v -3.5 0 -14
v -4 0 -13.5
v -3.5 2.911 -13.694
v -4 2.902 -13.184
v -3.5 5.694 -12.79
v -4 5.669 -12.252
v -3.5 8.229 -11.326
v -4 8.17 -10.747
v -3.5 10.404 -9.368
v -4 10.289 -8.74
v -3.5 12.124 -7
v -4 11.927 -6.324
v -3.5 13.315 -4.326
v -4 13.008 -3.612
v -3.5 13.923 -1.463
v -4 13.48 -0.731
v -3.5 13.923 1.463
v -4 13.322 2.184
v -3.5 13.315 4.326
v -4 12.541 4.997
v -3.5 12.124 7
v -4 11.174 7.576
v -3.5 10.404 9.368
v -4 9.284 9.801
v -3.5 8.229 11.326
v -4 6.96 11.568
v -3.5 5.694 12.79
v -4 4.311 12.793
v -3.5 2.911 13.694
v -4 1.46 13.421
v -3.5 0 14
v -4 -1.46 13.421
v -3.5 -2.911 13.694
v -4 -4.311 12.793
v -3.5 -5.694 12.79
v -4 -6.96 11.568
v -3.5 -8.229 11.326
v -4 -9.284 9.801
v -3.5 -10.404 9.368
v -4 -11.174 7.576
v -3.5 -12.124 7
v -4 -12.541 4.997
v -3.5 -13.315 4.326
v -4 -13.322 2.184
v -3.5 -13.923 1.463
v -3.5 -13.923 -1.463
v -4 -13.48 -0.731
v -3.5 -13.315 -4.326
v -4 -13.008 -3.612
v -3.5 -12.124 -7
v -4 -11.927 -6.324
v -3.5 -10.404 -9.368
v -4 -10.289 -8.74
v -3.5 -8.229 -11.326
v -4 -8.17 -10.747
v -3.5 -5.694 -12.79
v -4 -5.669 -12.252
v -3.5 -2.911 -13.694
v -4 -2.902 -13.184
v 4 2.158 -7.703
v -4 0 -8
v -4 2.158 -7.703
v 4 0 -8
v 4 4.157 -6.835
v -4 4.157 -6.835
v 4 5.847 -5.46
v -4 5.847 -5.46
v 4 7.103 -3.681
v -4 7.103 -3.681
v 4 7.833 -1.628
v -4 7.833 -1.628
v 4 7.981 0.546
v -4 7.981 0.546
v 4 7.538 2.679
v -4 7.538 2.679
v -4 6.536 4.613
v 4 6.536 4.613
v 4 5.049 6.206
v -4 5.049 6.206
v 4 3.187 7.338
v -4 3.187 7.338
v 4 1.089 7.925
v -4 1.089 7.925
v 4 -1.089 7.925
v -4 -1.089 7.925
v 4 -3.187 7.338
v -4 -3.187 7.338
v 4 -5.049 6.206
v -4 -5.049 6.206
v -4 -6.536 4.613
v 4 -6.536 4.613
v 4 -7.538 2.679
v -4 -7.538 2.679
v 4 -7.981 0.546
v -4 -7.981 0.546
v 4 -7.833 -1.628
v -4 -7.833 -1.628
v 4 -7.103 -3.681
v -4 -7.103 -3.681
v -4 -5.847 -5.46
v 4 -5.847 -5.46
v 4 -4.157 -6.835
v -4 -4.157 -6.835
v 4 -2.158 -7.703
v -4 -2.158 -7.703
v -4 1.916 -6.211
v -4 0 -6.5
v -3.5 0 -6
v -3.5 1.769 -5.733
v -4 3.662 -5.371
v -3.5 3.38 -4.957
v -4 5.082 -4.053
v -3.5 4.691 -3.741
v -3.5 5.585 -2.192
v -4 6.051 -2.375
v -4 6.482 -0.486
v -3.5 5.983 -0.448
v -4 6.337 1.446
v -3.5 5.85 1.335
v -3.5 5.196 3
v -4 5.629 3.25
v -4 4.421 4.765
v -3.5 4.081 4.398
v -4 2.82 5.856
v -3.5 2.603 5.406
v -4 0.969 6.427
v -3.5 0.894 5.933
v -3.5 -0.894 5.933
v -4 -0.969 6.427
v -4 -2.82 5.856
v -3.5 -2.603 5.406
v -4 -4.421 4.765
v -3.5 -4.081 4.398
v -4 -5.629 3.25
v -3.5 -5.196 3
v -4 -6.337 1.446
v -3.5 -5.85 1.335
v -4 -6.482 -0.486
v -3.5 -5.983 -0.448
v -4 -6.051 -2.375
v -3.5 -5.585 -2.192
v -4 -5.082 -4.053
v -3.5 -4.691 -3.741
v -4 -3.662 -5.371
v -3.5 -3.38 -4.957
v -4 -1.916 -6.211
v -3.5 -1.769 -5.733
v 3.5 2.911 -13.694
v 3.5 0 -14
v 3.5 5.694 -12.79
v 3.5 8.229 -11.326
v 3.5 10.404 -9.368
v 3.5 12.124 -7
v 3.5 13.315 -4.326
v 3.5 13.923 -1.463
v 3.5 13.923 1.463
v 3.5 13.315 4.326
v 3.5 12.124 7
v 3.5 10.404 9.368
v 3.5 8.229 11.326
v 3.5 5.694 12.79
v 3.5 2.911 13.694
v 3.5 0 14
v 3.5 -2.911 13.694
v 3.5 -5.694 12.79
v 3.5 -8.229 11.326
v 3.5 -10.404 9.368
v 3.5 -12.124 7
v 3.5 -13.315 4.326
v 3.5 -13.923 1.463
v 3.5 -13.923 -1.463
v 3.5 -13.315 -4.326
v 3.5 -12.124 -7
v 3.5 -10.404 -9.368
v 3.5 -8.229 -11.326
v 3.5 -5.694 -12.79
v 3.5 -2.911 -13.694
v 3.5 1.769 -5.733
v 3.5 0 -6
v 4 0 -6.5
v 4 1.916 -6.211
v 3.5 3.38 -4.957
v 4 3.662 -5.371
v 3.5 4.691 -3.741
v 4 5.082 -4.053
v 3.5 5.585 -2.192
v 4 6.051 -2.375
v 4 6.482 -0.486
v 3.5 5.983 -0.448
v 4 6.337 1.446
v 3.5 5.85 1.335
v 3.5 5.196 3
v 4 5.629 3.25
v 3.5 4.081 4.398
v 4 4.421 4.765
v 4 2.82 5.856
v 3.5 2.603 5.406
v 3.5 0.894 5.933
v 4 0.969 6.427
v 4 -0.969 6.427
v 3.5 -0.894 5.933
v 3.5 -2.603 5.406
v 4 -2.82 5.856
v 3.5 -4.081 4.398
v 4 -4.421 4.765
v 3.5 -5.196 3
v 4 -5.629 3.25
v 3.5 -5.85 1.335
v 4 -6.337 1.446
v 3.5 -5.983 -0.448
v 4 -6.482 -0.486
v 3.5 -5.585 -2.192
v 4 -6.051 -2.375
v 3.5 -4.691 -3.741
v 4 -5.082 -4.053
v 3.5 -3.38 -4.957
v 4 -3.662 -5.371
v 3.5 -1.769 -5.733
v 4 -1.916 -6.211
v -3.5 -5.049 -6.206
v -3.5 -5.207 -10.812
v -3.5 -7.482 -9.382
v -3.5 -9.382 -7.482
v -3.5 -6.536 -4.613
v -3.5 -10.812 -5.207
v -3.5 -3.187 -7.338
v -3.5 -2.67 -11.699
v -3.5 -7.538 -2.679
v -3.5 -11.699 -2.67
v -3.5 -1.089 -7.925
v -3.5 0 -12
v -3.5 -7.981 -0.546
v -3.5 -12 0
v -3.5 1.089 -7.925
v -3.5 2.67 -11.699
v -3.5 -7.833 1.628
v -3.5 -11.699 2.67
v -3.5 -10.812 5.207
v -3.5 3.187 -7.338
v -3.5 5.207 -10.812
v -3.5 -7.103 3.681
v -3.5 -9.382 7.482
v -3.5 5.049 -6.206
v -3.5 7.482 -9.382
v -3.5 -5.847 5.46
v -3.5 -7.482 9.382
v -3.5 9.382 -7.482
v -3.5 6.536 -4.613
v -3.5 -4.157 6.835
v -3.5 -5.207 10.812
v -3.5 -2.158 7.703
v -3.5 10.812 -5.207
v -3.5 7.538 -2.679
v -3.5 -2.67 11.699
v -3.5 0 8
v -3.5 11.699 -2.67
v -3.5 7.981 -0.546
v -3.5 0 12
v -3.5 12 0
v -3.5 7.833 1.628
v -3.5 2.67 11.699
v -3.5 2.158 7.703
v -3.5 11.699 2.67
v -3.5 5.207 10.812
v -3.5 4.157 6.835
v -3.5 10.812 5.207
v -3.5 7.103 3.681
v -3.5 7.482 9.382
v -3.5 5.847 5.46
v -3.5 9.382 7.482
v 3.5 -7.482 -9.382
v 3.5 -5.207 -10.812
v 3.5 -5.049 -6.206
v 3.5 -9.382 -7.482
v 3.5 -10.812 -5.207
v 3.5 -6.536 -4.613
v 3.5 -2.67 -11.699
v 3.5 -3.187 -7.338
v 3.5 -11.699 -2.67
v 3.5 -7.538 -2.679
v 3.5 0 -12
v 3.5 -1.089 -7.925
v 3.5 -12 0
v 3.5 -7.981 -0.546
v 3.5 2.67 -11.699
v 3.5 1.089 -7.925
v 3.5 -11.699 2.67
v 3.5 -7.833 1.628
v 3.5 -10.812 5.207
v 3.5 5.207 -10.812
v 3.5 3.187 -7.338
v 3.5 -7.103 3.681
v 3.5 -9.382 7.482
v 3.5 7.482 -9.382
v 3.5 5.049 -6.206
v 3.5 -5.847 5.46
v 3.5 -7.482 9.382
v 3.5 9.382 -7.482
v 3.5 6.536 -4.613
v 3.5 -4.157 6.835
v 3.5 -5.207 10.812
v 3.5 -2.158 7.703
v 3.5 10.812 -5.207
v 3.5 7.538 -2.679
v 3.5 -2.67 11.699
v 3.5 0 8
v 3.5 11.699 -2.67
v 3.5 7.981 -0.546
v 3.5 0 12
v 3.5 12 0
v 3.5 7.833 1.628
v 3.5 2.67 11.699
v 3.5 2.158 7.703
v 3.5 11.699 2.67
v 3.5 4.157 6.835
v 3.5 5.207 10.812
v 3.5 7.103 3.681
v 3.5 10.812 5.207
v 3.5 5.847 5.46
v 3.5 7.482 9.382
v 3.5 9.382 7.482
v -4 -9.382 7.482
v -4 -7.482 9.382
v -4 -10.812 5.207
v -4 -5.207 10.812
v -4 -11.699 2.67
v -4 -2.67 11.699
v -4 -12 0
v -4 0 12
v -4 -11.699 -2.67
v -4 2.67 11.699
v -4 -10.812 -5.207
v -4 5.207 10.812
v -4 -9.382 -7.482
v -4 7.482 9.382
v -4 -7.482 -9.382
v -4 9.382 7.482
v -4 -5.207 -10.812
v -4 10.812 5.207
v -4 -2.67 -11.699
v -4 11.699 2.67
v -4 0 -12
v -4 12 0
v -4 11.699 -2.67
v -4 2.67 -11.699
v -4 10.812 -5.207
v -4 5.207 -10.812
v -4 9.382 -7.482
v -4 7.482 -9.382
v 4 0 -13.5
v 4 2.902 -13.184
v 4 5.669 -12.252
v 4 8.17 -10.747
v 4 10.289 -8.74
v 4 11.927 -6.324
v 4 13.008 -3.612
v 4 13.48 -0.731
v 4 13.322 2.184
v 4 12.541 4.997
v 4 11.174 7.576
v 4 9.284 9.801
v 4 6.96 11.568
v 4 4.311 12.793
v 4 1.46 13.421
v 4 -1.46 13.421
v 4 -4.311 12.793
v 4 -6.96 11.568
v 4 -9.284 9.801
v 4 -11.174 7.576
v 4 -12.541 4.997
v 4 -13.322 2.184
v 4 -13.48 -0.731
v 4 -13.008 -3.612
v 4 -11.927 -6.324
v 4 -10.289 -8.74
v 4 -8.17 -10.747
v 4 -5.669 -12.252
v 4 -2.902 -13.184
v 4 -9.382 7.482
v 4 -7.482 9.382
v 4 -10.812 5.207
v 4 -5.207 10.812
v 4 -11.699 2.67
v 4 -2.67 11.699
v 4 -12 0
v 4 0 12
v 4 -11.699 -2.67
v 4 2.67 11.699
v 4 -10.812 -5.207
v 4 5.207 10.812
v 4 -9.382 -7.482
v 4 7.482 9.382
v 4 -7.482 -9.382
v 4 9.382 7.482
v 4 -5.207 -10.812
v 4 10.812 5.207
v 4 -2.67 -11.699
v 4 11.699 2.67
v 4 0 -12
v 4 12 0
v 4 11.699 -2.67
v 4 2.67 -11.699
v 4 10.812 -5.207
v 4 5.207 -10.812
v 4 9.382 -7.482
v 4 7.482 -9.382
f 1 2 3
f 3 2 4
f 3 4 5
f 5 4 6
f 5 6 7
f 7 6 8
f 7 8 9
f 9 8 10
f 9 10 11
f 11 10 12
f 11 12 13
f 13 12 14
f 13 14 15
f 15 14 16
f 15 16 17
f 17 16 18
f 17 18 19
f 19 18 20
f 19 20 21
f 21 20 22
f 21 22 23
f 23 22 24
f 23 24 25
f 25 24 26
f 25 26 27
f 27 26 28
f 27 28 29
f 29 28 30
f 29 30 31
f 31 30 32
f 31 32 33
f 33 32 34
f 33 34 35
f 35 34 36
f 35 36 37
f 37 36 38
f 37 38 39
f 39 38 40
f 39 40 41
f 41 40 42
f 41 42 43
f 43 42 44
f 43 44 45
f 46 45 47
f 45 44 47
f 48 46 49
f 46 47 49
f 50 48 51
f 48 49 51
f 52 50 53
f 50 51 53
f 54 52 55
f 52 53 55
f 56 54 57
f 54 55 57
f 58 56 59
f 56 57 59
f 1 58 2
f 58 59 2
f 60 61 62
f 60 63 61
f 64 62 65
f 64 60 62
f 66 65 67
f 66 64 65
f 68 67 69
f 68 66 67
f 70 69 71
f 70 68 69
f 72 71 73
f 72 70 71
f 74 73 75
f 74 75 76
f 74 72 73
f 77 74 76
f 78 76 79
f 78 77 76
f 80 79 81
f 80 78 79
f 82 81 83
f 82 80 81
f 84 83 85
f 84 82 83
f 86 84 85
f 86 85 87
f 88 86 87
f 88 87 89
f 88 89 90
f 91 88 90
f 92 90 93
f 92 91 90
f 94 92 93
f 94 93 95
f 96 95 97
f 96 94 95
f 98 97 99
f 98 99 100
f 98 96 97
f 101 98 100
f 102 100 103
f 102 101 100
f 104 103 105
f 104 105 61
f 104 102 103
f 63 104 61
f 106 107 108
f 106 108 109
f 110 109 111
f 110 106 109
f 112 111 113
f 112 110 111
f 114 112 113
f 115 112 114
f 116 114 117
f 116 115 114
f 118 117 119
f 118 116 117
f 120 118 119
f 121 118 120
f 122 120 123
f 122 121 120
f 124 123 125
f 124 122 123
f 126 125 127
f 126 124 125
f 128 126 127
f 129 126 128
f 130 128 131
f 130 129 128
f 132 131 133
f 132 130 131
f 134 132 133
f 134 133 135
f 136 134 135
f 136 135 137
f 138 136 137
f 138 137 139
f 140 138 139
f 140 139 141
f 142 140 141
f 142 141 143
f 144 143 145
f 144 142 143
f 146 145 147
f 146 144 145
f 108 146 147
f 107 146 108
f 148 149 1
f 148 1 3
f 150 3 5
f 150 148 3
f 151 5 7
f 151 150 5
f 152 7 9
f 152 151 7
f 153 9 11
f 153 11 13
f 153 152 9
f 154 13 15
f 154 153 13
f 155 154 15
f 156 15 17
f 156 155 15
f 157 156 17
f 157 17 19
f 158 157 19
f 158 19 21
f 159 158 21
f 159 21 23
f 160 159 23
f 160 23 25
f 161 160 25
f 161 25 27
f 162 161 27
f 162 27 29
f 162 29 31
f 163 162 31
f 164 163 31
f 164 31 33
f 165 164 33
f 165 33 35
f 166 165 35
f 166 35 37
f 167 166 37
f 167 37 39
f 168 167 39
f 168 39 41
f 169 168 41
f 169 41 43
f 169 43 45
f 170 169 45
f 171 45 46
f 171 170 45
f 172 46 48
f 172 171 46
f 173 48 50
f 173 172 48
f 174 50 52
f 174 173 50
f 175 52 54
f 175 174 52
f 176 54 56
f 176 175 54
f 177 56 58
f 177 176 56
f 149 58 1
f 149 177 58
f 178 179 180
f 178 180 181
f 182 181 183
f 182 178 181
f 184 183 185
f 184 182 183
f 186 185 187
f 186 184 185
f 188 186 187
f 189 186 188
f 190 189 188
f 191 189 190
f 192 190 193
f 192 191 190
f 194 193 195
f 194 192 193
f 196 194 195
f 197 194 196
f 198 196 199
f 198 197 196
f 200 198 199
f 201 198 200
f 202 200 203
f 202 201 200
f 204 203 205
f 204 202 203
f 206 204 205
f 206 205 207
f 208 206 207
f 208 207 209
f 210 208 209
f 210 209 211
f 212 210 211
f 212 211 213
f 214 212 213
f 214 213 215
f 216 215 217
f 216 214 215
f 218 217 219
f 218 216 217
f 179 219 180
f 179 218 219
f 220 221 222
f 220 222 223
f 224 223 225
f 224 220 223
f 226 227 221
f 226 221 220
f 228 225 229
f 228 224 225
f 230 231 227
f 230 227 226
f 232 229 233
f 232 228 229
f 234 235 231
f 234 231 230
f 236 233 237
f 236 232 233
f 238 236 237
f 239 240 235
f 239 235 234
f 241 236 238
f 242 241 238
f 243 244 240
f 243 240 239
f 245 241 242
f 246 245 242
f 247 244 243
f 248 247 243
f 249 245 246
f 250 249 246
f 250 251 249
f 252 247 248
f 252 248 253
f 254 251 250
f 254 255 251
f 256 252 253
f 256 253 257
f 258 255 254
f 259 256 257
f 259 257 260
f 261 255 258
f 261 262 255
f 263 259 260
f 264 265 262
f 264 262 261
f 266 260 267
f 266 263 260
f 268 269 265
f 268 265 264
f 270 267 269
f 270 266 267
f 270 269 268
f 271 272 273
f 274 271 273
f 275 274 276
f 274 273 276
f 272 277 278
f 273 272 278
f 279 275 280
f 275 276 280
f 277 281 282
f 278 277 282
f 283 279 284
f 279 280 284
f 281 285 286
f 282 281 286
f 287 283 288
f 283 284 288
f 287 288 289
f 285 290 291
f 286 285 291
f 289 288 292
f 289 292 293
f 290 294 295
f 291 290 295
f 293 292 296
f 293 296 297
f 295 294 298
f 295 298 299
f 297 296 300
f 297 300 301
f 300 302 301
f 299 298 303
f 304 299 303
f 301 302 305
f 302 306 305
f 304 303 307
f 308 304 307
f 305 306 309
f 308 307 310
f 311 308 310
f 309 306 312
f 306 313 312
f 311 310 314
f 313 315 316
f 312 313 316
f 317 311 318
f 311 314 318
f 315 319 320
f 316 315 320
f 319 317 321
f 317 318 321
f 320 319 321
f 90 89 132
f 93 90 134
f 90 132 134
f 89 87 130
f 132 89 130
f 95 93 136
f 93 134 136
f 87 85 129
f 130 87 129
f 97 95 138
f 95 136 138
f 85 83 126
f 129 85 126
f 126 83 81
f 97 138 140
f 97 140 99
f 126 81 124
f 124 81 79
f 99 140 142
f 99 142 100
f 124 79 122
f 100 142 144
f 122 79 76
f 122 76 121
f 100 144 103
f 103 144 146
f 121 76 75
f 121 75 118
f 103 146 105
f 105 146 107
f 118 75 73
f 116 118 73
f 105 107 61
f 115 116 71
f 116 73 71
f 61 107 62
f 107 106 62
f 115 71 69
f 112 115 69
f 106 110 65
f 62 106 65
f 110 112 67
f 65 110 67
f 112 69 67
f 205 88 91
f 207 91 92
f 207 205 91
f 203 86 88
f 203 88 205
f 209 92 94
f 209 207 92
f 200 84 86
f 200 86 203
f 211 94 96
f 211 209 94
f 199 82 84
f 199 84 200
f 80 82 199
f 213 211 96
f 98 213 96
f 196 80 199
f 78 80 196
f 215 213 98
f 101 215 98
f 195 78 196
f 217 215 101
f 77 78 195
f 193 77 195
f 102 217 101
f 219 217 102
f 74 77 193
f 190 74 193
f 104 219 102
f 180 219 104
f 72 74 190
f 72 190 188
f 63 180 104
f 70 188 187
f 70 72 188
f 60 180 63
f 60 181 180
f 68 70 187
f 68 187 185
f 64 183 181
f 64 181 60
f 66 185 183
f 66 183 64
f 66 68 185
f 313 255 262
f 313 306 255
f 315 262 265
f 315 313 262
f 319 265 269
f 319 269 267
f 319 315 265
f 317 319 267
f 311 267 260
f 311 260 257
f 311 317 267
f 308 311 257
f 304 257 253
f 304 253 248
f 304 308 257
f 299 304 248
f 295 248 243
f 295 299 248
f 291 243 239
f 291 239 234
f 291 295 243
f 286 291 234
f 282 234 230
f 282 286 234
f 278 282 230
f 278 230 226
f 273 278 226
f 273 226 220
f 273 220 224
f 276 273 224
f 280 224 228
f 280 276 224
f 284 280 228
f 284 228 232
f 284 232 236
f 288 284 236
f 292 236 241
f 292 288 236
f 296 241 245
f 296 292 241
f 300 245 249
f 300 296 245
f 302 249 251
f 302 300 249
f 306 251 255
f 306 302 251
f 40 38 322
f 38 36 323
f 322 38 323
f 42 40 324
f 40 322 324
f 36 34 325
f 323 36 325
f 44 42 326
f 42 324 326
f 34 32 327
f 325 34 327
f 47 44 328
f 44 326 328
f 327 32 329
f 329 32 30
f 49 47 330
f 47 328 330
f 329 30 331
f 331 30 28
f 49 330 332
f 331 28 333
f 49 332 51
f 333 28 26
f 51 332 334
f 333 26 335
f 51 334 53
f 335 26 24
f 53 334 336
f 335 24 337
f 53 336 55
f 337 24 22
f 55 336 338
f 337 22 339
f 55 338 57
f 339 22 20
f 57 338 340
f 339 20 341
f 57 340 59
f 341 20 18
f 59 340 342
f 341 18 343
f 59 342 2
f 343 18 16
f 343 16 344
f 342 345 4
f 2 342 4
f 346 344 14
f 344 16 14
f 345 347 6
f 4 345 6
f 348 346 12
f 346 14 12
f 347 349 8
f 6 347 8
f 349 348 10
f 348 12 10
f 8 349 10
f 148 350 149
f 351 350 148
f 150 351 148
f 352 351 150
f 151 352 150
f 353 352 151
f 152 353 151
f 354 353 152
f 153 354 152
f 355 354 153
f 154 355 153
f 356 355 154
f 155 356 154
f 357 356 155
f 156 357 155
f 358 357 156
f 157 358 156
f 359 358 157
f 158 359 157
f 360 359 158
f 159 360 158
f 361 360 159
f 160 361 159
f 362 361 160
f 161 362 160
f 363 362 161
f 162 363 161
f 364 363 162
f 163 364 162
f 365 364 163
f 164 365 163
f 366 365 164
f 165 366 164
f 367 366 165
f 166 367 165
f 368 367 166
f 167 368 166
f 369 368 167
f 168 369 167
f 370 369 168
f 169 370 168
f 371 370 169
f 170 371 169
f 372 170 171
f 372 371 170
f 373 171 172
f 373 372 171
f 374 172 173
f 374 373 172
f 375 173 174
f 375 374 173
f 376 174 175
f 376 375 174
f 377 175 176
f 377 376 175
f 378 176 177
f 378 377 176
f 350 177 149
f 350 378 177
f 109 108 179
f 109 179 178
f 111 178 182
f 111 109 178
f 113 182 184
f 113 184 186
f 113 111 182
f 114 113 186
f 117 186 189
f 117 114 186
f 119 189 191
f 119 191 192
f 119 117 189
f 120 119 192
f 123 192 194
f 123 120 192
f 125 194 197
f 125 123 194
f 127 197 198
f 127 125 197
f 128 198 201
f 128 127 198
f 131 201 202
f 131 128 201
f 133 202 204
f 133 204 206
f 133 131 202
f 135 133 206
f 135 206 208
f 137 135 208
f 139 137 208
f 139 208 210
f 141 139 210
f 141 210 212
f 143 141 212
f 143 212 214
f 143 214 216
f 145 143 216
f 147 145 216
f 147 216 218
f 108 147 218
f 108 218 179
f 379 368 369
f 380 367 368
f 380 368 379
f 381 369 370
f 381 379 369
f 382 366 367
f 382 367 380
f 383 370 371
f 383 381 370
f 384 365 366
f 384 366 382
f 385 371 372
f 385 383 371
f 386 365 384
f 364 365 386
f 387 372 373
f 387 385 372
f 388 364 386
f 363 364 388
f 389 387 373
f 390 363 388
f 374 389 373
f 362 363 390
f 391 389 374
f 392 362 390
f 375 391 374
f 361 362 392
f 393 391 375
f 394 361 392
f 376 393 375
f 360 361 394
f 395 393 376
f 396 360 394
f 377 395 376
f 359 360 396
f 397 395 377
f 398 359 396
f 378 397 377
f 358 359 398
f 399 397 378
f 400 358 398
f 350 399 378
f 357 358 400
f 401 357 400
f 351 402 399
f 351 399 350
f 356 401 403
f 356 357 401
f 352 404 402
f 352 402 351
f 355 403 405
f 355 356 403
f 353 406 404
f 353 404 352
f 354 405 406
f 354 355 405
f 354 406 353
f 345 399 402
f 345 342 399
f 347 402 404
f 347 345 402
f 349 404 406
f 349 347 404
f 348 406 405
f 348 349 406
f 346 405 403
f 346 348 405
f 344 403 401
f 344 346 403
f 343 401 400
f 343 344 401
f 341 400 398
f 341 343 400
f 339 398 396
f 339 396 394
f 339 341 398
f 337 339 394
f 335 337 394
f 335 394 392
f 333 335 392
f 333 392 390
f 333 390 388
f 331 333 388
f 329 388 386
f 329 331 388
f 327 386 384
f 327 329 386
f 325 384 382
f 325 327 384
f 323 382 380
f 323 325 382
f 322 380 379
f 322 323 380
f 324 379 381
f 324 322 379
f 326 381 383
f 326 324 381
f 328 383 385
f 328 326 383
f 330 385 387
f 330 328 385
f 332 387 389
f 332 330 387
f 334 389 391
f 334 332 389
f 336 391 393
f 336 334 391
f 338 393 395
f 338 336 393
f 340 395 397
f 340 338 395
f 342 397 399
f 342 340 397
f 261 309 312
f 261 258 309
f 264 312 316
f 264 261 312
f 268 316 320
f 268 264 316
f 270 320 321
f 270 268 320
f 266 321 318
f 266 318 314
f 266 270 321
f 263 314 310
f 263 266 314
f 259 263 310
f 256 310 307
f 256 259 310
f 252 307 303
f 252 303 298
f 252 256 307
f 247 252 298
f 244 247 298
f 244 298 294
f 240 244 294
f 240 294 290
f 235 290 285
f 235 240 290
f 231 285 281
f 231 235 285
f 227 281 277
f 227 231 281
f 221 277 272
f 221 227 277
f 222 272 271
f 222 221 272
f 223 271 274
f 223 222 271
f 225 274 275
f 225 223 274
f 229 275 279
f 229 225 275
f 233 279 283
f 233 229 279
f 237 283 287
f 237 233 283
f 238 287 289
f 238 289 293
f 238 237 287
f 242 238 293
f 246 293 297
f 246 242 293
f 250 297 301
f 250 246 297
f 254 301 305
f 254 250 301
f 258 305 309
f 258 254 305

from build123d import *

# Parameters (mm, degrees)
SKETCH1_R             = 14
SKETCH1_R_2           = 12
BOSS_EXTRUDE1_DEPTH   = 4
SKETCH1_R_3           = 8
SKETCH1_R_4           = 6
BOSS_EXTRUDE1_2_DEPTH = 4
SKETCH2_R             = 12
SKETCH2_R_2           = 8
BOSS_EXTRUDE2_DEPTH   = 3.5
CHAMFER1_SIZE         = 0.5
CHAMFER2_SIZE         = 0.5


with BuildPart() as part:
    # Sketch1 → Boss-Extrude1 (new, symmetric)
    with BuildSketch(Plane(origin=(0, 0, 0), x_dir=(0, 0, -1), z_dir=(1, 0, 0))):
        Circle(SKETCH1_R)
        Circle(SKETCH1_R_2, mode=Mode.SUBTRACT)
    extrude(amount=BOSS_EXTRUDE1_DEPTH, both=True)

    # Chamfer1
    chamfer1_edges = [part.edges().sort_by_distance(p)[0] for p in [
        (-4, 0, 14),
        (4, 0, 14),
    ]]
    chamfer(chamfer1_edges, length=CHAMFER1_SIZE)


with BuildPart() as body_2:
    # Sketch1 → Boss-Extrude1 2 (new, symmetric)
    with BuildSketch(Plane(origin=(0, 0, 0), x_dir=(0, 0, -1), z_dir=(1, 0, 0))):
        Circle(SKETCH1_R_3)
        Circle(SKETCH1_R_4, mode=Mode.SUBTRACT)
    extrude(amount=BOSS_EXTRUDE1_2_DEPTH, both=True)

    # Chamfer2
    chamfer2_edges = [body_2.edges().sort_by_distance(p)[0] for p in [
        (-4, 0, 6),
        (4, 0, 6),
    ]]
    chamfer(chamfer2_edges, length=CHAMFER2_SIZE)


with BuildPart() as body_3:
    # Sketch2 → Boss-Extrude2 (new, symmetric)
    with BuildSketch(Plane.ZY):
        Circle(SKETCH2_R)
        Circle(SKETCH2_R_2, mode=Mode.SUBTRACT)
    extrude(amount=BOSS_EXTRUDE2_DEPTH, both=True)


solid = Compound([part.part, body_2.part, body_3.part])
